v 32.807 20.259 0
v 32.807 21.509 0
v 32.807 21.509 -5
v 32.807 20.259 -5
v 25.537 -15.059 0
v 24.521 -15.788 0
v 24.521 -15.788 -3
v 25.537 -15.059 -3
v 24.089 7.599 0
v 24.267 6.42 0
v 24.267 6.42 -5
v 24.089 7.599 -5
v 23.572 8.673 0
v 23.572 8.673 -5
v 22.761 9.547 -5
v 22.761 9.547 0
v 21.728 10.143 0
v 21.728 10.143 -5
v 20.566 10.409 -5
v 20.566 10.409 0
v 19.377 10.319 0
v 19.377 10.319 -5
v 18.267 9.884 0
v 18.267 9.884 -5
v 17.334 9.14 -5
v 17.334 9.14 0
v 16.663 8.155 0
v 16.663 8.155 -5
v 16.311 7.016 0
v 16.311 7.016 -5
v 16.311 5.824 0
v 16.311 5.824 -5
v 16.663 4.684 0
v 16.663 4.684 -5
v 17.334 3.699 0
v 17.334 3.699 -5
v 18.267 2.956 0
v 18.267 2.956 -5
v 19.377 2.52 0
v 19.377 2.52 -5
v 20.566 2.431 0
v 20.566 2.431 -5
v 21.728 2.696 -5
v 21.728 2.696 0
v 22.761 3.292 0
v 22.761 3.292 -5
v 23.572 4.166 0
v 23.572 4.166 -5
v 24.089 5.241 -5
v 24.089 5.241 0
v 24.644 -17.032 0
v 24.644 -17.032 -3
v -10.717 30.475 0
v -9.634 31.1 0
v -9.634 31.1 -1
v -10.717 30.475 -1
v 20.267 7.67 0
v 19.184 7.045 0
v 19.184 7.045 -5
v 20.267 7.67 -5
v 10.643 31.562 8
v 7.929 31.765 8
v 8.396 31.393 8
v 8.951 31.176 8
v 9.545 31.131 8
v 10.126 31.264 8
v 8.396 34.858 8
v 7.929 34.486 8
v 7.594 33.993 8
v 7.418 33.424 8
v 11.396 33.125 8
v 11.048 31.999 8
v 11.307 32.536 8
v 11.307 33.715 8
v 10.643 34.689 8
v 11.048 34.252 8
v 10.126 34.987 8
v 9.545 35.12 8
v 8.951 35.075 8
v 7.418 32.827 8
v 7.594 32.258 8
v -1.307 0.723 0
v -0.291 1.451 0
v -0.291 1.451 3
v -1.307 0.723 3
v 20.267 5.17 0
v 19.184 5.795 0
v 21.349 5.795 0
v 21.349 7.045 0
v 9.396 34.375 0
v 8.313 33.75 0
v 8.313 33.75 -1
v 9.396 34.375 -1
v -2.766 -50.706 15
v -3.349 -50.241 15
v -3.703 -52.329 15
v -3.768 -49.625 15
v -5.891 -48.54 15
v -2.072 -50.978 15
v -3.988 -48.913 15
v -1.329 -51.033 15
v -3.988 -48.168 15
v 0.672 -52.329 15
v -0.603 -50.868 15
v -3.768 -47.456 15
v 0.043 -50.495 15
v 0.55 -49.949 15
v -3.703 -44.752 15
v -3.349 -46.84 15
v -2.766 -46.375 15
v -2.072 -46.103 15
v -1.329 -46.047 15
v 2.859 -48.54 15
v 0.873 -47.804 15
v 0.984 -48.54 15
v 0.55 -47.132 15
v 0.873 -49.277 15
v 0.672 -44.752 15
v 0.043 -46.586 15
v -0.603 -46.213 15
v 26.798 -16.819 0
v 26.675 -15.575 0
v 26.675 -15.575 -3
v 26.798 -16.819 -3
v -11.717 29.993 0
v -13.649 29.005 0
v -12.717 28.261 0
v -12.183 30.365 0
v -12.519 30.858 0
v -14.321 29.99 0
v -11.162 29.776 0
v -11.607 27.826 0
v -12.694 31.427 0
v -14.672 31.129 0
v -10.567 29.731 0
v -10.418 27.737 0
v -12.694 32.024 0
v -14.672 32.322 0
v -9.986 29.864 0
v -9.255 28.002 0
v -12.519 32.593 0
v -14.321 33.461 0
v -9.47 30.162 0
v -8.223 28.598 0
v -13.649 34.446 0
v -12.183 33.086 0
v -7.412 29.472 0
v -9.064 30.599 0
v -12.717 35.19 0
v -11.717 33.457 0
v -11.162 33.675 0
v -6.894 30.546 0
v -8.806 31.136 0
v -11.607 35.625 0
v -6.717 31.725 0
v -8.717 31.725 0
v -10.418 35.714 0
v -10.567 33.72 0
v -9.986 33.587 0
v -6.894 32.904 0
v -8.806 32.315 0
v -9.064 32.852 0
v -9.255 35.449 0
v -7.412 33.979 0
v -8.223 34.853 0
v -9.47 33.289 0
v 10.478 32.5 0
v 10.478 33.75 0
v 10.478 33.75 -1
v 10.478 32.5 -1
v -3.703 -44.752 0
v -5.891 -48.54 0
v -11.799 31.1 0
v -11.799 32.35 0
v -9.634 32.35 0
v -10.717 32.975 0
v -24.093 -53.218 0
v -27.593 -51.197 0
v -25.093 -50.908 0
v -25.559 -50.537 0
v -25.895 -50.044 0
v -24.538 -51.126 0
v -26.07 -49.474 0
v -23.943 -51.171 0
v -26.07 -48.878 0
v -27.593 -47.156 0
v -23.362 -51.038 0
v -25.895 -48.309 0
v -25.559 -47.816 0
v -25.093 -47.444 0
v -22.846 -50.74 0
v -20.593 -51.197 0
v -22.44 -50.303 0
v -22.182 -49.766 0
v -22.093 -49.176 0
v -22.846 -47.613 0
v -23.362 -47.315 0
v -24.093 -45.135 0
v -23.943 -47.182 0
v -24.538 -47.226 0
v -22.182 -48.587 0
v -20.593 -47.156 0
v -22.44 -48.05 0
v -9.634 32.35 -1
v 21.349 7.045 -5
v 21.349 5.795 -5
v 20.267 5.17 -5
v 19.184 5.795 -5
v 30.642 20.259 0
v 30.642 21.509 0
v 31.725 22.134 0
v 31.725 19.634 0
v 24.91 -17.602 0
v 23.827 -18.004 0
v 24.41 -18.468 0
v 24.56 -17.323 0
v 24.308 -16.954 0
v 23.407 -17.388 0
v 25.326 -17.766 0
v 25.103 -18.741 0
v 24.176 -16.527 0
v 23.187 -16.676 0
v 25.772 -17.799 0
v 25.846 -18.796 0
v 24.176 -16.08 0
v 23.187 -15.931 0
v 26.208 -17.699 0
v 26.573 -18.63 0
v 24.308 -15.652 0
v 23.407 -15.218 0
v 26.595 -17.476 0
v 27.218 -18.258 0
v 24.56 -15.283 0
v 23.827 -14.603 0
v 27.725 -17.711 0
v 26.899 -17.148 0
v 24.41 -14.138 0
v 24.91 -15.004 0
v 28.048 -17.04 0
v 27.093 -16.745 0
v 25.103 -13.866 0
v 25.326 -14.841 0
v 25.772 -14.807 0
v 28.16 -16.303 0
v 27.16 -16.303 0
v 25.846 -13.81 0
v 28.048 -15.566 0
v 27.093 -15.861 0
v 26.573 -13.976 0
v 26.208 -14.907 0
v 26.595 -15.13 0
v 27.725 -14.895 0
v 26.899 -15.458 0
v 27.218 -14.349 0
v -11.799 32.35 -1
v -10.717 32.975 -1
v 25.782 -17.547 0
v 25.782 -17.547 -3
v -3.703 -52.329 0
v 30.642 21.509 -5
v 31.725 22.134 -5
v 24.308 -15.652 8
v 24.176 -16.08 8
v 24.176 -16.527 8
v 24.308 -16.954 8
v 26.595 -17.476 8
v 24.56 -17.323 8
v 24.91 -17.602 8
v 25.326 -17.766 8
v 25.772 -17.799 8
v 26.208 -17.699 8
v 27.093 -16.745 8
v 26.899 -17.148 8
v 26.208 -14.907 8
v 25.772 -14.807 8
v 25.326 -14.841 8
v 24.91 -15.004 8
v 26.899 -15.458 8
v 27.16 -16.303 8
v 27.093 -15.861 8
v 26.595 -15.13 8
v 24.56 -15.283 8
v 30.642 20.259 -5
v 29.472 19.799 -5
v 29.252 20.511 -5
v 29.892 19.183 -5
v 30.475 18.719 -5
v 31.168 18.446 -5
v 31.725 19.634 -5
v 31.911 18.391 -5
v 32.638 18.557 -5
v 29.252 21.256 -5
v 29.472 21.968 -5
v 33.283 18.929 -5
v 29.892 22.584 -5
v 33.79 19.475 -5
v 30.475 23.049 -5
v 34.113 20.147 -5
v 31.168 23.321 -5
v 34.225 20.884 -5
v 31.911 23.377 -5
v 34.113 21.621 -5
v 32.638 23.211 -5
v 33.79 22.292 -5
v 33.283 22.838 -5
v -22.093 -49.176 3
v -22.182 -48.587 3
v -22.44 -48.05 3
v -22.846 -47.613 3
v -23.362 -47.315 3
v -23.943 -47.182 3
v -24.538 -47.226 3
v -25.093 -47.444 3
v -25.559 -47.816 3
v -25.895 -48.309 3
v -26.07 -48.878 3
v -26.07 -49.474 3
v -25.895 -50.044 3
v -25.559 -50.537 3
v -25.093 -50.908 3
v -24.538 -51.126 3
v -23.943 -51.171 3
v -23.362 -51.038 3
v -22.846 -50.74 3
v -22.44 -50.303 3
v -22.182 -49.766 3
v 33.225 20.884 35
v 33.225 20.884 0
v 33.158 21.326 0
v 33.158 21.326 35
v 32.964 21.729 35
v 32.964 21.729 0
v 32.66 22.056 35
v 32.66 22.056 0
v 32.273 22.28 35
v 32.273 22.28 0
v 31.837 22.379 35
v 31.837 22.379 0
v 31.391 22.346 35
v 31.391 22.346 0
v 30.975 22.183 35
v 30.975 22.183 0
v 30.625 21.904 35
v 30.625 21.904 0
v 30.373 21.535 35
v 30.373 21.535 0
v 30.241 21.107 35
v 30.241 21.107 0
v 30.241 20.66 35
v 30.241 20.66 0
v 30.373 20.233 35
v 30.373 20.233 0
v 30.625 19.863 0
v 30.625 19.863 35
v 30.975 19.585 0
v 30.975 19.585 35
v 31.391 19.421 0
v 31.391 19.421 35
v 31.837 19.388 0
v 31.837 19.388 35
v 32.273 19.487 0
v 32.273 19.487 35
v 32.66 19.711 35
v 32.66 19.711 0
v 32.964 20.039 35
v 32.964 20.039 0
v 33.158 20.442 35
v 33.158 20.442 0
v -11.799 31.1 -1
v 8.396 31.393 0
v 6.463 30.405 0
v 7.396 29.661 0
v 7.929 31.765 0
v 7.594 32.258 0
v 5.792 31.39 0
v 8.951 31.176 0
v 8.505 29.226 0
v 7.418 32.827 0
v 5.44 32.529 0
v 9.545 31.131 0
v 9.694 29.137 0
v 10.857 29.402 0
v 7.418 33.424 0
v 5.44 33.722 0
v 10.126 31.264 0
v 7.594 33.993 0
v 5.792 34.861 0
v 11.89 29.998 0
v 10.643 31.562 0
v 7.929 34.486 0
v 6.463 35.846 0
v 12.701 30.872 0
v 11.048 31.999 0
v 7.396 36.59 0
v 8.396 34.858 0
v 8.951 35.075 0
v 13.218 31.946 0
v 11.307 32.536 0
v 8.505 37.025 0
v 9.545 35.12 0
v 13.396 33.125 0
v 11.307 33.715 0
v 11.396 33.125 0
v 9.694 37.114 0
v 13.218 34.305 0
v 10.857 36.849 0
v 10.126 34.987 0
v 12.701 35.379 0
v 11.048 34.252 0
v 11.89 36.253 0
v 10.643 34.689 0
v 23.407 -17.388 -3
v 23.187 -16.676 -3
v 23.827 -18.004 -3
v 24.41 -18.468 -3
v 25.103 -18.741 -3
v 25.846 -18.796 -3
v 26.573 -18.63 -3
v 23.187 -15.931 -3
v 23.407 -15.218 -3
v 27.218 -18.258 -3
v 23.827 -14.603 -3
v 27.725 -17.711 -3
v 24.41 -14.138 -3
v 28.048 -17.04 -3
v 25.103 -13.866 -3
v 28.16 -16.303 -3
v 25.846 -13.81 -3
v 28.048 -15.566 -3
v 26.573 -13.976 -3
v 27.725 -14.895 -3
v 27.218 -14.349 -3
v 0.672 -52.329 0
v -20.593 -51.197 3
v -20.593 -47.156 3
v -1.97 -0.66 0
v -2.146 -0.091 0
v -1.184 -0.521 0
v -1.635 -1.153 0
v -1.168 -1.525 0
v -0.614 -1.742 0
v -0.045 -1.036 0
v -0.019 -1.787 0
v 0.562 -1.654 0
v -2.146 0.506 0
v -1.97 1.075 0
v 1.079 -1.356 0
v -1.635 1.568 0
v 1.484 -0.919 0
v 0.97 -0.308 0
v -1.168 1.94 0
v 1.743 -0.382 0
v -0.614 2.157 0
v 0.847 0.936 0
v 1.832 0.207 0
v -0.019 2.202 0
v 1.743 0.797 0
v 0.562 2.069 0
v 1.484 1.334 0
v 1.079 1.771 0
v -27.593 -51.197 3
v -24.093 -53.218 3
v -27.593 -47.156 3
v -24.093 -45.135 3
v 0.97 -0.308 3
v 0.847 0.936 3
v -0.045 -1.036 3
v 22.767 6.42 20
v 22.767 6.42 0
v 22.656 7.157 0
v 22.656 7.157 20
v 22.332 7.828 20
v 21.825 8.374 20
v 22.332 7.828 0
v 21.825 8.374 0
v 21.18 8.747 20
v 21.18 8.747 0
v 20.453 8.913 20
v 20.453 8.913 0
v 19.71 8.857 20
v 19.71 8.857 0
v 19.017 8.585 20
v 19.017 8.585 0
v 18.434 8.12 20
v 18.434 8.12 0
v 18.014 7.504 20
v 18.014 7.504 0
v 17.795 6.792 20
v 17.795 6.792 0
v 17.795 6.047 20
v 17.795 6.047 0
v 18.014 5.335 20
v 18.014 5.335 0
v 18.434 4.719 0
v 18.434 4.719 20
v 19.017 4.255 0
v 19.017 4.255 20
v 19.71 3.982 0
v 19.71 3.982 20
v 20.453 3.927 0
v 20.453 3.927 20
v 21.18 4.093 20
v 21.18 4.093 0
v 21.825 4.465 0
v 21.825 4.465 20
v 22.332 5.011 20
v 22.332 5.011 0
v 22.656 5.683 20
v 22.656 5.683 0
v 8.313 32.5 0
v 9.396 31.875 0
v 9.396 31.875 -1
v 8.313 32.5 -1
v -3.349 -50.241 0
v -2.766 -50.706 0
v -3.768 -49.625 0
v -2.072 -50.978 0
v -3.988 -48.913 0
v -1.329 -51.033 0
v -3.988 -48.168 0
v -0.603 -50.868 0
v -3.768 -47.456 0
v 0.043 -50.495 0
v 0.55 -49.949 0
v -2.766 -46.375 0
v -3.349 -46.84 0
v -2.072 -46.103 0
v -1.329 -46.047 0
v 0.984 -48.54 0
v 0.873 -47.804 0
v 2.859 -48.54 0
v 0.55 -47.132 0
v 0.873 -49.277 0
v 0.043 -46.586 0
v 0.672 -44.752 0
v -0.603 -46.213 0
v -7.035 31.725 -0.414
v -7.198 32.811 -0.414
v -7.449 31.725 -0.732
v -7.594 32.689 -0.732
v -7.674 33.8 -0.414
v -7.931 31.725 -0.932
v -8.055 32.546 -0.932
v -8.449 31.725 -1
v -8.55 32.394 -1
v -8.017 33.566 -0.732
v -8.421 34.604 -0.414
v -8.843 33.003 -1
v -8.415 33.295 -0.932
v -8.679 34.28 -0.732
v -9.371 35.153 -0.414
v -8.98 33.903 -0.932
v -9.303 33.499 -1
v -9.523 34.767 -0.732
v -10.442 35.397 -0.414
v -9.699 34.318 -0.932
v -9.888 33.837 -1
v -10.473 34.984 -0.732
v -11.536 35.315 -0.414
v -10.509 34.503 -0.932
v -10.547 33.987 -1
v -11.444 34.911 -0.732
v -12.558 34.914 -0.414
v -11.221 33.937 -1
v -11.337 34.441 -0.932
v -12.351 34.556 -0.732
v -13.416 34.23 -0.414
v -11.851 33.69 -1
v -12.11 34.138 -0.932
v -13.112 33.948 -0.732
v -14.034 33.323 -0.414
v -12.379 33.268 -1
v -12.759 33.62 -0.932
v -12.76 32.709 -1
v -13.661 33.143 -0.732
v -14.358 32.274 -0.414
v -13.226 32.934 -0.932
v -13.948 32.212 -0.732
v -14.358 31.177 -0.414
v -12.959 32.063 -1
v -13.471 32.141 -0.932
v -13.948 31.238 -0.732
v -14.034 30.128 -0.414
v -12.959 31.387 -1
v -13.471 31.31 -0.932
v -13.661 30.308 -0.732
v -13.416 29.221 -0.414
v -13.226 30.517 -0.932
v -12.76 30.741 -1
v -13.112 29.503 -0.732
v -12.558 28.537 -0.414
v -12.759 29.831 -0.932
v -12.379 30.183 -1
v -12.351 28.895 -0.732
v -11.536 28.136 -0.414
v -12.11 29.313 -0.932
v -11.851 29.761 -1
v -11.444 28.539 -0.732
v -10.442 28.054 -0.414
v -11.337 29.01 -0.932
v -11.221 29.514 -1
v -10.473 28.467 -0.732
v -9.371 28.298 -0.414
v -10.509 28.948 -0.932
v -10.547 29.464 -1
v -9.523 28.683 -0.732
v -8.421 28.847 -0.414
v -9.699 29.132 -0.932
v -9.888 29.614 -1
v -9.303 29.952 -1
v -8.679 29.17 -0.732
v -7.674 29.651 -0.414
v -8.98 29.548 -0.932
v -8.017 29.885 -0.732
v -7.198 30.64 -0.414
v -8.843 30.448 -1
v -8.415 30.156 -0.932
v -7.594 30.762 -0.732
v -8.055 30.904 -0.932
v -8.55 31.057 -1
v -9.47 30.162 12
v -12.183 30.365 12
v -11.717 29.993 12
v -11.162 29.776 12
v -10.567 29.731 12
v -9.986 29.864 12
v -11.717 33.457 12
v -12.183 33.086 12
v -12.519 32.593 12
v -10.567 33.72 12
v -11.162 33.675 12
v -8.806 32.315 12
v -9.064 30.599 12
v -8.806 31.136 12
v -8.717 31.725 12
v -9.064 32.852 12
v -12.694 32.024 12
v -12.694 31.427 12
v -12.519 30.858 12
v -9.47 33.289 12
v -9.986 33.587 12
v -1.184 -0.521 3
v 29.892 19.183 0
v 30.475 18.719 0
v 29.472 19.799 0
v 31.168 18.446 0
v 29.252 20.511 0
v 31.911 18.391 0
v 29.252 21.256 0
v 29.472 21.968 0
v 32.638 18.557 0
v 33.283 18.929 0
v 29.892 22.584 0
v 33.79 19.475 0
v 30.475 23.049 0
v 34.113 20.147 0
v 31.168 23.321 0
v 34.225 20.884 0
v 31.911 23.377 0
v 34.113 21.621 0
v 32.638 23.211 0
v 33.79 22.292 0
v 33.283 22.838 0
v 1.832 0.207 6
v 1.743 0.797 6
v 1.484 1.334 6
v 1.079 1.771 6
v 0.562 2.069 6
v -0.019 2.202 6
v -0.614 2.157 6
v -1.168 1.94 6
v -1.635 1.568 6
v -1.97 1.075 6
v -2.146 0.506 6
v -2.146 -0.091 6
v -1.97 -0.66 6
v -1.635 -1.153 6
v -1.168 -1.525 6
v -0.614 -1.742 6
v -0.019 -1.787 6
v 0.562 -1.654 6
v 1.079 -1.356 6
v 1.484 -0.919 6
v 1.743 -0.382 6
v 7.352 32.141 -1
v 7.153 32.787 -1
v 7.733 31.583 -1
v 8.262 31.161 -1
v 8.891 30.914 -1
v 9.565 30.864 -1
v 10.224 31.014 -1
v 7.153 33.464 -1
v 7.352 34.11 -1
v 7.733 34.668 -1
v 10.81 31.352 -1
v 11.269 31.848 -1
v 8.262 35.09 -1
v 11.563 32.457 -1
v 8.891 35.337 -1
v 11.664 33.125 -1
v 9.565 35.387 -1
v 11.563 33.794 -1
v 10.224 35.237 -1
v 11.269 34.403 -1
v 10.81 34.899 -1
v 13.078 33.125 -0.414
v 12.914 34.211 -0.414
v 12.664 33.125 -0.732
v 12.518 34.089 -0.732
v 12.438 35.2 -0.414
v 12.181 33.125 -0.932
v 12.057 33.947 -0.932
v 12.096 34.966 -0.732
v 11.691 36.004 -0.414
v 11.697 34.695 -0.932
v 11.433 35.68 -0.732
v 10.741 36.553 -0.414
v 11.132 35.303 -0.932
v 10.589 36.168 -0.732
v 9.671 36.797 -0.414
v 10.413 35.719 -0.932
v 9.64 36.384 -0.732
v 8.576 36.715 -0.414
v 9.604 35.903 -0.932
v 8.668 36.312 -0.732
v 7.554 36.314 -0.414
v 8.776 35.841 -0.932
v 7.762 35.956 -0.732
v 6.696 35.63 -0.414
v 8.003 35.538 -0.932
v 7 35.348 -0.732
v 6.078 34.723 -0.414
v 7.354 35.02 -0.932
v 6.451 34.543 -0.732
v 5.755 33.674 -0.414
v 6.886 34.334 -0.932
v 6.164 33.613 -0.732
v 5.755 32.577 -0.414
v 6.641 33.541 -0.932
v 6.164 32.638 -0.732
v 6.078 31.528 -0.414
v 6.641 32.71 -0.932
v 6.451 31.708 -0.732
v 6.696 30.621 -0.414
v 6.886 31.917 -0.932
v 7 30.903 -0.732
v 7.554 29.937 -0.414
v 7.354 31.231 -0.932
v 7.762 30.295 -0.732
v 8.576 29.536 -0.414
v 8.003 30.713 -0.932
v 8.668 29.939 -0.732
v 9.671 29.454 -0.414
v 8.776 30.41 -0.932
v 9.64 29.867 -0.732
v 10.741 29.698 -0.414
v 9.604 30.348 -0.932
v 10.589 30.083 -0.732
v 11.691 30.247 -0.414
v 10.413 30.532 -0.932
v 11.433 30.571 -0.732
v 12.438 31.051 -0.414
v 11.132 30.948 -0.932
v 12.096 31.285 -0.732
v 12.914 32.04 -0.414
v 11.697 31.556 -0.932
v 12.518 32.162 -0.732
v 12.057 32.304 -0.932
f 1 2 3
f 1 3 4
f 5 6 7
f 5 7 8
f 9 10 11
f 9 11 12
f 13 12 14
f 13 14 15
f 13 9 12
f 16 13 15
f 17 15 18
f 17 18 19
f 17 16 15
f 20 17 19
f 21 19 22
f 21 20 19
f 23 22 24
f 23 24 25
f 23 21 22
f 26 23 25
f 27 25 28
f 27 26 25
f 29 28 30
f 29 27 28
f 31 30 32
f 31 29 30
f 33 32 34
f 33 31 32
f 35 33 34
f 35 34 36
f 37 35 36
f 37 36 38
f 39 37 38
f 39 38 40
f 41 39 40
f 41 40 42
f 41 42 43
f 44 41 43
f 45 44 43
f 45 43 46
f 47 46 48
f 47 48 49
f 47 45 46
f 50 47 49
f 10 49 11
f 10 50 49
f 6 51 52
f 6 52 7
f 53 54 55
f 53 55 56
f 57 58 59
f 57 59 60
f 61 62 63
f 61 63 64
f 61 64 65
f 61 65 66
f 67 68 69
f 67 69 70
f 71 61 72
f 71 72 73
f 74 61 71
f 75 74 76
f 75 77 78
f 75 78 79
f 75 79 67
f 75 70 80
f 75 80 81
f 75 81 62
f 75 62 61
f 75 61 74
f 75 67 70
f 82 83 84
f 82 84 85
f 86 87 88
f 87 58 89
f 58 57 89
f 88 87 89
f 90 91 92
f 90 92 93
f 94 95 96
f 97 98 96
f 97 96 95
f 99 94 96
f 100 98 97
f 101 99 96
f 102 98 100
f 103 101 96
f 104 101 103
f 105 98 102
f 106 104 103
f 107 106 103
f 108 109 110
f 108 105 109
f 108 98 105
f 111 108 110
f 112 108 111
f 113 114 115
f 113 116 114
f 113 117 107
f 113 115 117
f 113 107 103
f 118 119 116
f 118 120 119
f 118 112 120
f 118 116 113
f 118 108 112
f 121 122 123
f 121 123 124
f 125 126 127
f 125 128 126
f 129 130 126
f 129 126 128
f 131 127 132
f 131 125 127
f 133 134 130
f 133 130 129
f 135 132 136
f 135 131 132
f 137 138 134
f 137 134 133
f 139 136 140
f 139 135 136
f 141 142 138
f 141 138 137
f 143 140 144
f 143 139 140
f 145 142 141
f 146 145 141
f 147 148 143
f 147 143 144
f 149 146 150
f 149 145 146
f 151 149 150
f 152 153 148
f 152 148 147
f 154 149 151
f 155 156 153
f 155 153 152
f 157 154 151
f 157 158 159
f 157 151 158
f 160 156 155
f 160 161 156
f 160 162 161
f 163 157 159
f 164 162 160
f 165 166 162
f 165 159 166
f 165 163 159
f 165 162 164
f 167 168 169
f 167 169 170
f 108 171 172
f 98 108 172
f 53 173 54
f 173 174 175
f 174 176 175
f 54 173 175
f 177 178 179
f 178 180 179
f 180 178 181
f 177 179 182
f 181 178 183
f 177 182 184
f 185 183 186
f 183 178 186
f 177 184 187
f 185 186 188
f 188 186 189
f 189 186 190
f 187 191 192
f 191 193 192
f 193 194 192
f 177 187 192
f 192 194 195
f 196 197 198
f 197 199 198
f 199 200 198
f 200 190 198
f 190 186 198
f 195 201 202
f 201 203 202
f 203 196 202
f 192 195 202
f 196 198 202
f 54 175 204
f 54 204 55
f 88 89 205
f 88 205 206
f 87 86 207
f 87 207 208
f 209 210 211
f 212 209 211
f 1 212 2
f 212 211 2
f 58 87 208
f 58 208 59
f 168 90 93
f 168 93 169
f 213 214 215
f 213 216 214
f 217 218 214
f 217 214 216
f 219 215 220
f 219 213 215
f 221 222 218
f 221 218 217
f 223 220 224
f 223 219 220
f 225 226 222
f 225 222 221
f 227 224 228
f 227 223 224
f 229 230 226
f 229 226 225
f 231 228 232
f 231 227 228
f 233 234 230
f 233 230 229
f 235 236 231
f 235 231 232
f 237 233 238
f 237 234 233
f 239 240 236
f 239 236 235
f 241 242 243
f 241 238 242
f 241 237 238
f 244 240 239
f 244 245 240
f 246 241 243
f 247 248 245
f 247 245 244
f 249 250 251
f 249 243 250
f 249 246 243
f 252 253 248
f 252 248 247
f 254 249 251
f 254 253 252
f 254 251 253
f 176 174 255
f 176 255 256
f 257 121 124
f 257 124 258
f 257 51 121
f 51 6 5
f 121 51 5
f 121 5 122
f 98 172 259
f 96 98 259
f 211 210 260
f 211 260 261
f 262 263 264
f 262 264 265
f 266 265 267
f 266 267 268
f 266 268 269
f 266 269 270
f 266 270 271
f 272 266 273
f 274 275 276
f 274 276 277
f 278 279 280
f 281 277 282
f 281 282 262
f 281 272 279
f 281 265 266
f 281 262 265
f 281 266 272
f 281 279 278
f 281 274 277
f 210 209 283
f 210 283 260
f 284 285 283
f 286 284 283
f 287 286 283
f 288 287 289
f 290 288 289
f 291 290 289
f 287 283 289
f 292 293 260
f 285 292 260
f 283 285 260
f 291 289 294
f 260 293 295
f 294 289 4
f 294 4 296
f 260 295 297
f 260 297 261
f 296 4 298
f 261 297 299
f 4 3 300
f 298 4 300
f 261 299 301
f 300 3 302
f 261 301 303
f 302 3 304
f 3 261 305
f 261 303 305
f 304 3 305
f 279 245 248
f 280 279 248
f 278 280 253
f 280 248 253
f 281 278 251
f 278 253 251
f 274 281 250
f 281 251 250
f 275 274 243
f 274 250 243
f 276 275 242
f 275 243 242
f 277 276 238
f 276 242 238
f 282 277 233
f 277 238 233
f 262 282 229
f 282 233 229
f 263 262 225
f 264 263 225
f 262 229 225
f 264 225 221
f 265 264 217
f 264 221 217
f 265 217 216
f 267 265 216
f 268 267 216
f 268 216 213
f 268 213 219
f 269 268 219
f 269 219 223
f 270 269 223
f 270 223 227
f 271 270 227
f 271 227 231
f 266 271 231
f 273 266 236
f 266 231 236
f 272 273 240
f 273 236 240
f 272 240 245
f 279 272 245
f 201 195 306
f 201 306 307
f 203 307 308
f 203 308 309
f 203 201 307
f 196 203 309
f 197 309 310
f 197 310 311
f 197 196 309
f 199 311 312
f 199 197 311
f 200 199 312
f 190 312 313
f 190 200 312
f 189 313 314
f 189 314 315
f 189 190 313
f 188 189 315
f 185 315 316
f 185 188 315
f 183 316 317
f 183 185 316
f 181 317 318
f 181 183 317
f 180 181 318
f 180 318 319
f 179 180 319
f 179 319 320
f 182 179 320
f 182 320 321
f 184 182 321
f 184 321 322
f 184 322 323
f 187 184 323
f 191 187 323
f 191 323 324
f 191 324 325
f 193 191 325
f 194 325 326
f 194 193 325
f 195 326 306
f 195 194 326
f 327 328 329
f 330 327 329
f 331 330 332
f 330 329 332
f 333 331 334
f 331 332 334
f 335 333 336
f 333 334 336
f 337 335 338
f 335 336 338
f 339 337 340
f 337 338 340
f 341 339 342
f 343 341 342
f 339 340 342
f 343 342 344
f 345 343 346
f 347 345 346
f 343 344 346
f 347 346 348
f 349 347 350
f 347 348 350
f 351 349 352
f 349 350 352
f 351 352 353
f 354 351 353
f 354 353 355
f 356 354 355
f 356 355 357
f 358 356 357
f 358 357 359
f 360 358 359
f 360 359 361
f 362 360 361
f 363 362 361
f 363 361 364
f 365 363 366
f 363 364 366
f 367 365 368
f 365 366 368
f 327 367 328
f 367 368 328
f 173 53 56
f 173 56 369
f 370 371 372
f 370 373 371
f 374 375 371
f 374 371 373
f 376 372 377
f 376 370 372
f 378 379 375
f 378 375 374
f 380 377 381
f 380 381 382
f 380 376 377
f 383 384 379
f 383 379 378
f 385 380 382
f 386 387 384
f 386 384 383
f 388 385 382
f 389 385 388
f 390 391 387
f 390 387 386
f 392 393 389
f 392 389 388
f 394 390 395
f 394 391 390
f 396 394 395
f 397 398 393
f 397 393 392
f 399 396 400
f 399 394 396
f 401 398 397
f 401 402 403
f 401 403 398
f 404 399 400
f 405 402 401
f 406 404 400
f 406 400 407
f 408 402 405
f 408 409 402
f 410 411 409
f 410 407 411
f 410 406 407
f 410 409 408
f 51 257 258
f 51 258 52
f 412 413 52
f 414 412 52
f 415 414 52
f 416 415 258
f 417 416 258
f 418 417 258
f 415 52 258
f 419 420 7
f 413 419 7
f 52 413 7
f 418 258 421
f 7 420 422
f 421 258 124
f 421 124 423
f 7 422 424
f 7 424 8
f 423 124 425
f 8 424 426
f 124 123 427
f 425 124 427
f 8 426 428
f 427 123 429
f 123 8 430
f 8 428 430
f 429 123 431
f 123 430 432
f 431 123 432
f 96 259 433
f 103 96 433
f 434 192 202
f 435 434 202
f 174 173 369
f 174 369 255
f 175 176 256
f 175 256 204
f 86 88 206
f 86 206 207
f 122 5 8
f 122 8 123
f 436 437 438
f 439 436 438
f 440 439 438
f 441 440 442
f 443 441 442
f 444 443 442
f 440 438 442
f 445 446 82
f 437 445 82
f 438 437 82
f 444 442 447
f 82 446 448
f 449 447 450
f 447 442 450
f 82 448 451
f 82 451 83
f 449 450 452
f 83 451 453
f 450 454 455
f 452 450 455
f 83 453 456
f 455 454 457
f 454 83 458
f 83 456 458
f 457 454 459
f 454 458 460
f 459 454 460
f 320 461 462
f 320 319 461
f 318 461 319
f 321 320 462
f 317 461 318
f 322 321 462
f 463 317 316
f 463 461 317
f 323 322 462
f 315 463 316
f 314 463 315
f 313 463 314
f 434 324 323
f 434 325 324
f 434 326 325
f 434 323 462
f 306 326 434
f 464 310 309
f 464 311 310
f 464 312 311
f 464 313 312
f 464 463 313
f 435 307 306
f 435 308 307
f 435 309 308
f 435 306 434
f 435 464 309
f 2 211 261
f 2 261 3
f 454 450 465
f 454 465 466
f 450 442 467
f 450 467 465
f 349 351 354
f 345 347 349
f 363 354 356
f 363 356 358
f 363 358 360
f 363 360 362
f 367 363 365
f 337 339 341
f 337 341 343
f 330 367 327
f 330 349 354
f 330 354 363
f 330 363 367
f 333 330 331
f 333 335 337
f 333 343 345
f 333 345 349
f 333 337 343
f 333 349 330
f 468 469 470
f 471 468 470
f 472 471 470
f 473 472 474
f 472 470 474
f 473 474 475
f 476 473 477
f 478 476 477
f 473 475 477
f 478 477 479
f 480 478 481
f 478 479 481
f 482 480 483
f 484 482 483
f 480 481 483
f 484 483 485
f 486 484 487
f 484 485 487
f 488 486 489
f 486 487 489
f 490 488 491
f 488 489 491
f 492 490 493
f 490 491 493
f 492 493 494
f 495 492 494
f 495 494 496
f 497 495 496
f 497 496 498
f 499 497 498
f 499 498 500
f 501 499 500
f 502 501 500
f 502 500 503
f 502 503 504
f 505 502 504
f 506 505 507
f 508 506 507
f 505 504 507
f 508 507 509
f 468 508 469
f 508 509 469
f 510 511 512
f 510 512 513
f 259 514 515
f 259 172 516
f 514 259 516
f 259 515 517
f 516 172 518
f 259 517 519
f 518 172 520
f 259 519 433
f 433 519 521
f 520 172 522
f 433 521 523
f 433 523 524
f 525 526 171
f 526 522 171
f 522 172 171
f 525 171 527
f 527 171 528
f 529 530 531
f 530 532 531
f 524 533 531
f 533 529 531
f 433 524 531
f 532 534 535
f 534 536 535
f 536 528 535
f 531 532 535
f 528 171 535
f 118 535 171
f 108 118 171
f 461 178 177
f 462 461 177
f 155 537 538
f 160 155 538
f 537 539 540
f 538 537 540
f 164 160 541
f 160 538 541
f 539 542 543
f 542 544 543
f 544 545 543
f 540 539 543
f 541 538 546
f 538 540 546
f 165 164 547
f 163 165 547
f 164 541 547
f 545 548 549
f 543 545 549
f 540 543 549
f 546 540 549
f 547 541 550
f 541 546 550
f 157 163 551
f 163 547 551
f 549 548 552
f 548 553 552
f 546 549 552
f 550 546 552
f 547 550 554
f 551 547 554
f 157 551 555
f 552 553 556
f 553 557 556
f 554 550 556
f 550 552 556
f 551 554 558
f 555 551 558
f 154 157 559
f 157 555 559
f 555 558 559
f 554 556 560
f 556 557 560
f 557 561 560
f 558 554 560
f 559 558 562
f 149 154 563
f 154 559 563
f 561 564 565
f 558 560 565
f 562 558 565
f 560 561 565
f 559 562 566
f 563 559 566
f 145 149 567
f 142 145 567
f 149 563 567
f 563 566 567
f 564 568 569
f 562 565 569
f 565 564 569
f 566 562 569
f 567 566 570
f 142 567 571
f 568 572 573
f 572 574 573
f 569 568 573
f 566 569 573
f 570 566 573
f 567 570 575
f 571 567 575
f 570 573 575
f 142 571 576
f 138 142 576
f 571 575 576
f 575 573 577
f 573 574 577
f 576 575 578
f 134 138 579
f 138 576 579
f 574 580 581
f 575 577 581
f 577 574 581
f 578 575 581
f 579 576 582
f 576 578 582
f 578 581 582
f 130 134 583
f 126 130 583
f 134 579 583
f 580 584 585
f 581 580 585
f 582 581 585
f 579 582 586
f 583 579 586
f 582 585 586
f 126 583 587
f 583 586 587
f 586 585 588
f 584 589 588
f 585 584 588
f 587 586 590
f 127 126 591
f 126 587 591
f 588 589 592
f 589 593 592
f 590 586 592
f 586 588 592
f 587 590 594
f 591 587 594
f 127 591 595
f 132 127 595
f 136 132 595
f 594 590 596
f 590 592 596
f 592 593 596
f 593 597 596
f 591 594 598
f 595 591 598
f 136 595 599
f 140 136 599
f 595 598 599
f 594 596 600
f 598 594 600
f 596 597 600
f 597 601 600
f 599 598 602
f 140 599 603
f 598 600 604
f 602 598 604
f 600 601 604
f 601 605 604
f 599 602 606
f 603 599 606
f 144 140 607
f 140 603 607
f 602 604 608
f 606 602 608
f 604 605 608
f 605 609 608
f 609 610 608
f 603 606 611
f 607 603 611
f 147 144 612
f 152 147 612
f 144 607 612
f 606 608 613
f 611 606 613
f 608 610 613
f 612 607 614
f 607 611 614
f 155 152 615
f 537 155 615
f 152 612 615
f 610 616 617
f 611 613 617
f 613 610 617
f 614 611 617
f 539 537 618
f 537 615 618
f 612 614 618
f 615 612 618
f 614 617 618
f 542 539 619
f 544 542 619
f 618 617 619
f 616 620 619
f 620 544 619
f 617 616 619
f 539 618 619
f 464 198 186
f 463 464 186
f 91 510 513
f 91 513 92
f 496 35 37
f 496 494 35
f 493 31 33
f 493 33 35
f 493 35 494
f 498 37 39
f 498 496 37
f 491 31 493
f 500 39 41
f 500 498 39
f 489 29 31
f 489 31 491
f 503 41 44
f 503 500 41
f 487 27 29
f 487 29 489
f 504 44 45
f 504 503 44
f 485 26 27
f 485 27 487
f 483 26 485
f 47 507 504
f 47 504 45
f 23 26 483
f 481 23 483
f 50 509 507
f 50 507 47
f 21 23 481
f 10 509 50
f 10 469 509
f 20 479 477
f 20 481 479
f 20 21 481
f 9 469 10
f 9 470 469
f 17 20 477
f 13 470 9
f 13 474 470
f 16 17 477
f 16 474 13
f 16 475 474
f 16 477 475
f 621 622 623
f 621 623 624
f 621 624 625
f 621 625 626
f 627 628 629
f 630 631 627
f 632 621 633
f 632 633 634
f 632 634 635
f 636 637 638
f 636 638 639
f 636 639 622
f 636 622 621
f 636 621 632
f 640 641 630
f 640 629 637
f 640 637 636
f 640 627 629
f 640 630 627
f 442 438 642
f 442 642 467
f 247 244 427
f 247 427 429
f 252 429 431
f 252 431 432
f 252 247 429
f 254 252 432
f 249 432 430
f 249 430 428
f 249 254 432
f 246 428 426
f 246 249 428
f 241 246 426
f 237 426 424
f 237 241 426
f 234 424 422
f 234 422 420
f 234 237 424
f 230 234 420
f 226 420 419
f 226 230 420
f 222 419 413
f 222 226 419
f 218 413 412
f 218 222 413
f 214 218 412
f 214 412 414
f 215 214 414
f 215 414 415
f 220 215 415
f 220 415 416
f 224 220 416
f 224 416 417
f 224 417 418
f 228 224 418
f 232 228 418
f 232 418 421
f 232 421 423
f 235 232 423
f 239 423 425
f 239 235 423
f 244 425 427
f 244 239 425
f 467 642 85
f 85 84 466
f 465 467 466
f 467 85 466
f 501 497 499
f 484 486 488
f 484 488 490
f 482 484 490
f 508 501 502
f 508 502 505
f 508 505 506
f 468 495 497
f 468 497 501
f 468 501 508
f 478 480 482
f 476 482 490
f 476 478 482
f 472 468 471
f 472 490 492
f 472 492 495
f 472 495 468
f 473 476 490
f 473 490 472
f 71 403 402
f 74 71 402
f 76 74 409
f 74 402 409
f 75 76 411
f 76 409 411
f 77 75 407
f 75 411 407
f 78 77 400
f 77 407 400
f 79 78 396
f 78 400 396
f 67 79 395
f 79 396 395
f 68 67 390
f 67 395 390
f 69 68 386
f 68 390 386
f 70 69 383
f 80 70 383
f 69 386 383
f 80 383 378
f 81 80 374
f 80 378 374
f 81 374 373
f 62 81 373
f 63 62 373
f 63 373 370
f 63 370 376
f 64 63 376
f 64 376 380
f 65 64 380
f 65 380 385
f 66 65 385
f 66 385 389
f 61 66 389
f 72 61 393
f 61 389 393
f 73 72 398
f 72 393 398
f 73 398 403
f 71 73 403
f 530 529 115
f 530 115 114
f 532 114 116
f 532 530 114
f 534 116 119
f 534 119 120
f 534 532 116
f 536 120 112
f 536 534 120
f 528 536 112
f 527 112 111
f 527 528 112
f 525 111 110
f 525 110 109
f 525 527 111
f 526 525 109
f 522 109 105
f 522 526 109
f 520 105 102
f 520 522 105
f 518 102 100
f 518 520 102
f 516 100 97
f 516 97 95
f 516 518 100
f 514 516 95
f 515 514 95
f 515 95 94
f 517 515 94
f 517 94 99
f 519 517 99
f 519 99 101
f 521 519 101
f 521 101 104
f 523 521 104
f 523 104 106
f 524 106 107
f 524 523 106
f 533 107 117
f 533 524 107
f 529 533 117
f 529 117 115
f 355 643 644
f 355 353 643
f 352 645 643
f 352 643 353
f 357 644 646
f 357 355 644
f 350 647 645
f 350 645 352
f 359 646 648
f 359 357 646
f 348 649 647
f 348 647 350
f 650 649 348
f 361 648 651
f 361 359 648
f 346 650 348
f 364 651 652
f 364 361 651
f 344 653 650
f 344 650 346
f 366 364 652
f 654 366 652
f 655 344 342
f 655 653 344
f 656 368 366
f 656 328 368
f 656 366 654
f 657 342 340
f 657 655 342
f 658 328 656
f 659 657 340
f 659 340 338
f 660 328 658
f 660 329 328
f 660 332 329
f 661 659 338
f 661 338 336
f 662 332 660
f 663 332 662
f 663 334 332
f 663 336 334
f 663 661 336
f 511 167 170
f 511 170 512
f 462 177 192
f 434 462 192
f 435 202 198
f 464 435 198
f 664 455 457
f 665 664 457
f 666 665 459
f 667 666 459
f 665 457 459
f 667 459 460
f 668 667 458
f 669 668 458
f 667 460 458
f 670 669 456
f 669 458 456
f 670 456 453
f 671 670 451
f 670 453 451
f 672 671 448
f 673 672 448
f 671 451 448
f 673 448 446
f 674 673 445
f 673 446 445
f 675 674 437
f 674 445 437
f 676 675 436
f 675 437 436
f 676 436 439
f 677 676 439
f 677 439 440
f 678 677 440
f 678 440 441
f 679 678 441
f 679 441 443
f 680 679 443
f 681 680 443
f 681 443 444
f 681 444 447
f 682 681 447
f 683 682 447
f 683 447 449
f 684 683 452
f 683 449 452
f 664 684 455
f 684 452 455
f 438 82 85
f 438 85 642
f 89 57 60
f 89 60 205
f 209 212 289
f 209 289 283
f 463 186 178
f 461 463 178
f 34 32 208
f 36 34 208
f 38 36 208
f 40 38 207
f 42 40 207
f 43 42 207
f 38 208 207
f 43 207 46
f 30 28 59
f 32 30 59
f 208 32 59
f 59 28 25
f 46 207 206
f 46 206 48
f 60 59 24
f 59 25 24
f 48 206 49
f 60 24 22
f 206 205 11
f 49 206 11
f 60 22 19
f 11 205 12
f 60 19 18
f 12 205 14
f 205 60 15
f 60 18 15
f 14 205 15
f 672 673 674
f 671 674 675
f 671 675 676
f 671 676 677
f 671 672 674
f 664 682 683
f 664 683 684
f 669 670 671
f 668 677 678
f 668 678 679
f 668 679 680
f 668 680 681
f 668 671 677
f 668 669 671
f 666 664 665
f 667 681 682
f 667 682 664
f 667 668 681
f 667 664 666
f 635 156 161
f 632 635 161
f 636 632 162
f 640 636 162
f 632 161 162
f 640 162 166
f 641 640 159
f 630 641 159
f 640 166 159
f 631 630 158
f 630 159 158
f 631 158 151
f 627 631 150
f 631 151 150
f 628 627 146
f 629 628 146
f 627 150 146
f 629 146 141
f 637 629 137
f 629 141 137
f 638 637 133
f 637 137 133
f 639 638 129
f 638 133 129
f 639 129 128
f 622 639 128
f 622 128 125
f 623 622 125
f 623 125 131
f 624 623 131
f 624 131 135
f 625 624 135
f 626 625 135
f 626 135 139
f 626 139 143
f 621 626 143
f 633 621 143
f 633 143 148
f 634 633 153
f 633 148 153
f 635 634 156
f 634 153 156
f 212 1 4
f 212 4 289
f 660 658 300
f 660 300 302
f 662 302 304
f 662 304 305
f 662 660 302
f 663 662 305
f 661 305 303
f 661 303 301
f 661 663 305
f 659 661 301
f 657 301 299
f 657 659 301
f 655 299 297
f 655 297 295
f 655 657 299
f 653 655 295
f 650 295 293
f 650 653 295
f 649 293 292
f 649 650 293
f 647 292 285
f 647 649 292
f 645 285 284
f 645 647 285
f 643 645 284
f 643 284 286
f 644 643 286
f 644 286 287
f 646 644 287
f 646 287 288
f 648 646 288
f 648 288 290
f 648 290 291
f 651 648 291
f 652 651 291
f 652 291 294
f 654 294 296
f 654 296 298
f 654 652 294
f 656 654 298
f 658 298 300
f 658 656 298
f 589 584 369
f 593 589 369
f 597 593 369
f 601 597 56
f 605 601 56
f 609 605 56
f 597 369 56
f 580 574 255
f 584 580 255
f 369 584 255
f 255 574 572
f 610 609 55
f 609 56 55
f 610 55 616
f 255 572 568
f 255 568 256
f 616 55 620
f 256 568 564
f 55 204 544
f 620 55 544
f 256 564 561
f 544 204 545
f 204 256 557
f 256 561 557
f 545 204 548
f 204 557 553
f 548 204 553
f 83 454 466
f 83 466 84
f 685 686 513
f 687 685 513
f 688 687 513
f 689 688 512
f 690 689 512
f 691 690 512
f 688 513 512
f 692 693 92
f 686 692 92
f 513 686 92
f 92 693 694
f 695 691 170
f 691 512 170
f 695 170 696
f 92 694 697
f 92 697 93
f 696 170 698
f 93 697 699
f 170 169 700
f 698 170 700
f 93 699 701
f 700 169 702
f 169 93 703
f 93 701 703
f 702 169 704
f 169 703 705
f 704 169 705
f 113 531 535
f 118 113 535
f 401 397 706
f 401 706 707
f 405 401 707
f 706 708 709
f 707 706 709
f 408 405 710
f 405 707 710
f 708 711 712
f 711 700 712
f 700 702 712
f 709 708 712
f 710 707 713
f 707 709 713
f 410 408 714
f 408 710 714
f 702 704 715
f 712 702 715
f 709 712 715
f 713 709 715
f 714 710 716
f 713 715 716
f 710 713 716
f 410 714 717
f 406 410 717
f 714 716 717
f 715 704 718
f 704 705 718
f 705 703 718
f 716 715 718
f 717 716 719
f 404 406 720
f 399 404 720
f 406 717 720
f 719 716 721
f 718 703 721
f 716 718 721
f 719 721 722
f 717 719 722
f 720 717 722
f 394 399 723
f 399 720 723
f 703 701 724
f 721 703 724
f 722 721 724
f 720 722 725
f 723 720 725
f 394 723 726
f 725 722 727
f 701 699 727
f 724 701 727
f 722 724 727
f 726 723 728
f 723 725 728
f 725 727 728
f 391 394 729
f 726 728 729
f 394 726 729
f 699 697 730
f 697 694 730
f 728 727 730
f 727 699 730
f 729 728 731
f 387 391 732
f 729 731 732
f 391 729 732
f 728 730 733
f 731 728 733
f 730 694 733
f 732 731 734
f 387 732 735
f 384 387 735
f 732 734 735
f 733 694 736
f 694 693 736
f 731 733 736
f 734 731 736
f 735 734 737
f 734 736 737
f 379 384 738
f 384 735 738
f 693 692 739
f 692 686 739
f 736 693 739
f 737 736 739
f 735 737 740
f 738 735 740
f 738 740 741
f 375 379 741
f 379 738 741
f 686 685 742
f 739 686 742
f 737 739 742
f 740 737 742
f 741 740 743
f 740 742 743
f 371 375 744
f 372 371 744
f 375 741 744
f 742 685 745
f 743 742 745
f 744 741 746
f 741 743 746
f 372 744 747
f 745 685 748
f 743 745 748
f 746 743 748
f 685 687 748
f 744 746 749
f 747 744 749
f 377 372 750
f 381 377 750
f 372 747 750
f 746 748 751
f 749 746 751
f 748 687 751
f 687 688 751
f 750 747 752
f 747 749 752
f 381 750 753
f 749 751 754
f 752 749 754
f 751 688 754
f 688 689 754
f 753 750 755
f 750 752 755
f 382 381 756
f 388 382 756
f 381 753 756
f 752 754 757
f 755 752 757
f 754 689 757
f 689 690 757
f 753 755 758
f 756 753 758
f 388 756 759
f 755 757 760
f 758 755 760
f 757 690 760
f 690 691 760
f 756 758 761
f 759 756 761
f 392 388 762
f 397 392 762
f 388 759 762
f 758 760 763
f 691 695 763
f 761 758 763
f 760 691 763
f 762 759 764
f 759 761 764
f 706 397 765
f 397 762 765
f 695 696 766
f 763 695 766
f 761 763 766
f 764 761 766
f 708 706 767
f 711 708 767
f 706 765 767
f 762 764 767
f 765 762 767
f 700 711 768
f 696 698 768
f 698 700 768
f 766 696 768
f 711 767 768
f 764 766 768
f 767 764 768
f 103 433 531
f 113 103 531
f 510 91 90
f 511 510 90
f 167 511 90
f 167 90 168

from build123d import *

# Parameters (mm, degrees)
F0_R      = 2
F1_DEPTH  = 6
F0_R_2    = 1.5
F2_DEPTH  = 8
F0_R_3    = 2.5
F3_DEPTH  = 3
F4_DEPTH  = 20
F0_R_4    = 4
F5_DEPTH  = 5
F6_DEPTH  = 3
F7_DEPTH  = 8
F8_DEPTH  = 1
F10_DEPTH = 35
F11_DEPTH = 3
F12_DEPTH = 12
F13_DEPTH = 15


# Not quite as in the source:
# - a fillet or chamfer that OpenCascade refuses, or shapes differently, is made with other operations: its cross-section is extruded or revolved along the edge and cut away or added


with BuildPart() as f1:
    # F0 (on Top) → F1 (new body)
    with BuildSketch(Plane.XY):
        with Locations((-0.1684613526, 0.2074986696)):
            Circle(F0_R)
        Polygon((-1.3072340101, 0.7229565578), (-0.2914480557, 1.4514336643), (0.8473246019, 0.9359757761), (0.970311305, -0.3079592185), (-0.0454746495, -1.036436325), (-1.1842473071, -0.5209784369), align=None, mode=Mode.SUBTRACT)
        Polygon((0.8473246019, 0.9359757761), (-0.2914480557, 1.4514336643), (-1.3072340101, 0.7229565578), (-1.1842473071, -0.5209784369), (-0.0454746495, -1.036436325), (0.970311305, -0.3079592185), align=None)
    extrude(amount=F1_DEPTH)

    # F0 (on Top) → F6 (cut)
    with BuildSketch(Plane.XY):
        Polygon((0.8473246019, 0.9359757761), (-0.2914480557, 1.4514336643), (-1.3072340101, 0.7229565578), (-1.1842473071, -0.5209784369), (-0.0454746495, -1.036436325), (0.970311305, -0.3079592185), align=None)
    extrude(amount=F6_DEPTH, mode=Mode.SUBTRACT)


with BuildPart() as f2:
    # F0 (on Top) → F2 (new body)
    with BuildSketch(Plane.XY):
        with Locations((25.6595015526, -16.3031816483)):
            Circle(F0_R_2)
        Polygon((24.520728895, -15.7877237601), (25.5365148495, -15.0592466536), (26.6752875071, -15.5747045418), (26.7982742101, -16.8186395364), (25.7824882557, -17.5471166429), (24.6437155981, -17.0316587548), align=None, mode=Mode.SUBTRACT)
        Polygon((26.6752875071, -15.5747045418), (25.5365148495, -15.0592466536), (24.520728895, -15.7877237601), (24.6437155981, -17.0316587548), (25.7824882557, -17.5471166429), (26.7982742101, -16.8186395364), align=None)
    extrude(amount=F2_DEPTH)

    # F0 (on Top) → F3 (join)
    with BuildSketch(Plane.XY):
        with Locations((25.6595015526, -16.3031816483)):
            Circle(F0_R_3)
        with Locations((25.6595015526, -16.3031816483)):
            Circle(F0_R_2, mode=Mode.SUBTRACT)
        with Locations((25.6595015526, -16.3031816483)):
            Circle(F0_R_2)
        Polygon((24.520728895, -15.7877237601), (25.5365148495, -15.0592466536), (26.6752875071, -15.5747045418), (26.7982742101, -16.8186395364), (25.7824882557, -17.5471166429), (24.6437155981, -17.0316587548), align=None, mode=Mode.SUBTRACT)
    extrude(amount=-F3_DEPTH)


with BuildPart() as f4:
    # F0 (on Top) → F4 (new body)
    with BuildSketch(Plane.XY):
        with Locations((20.266674459, 6.419762969)):
            Circle(F0_R_3)
        Polygon((19.1841427043, 7.044762969), (20.266674459, 7.669762969), (21.3492062137, 7.044762969), (21.3492062137, 5.794762969), (20.266674459, 5.169762969), (19.1841427043, 5.794762969), align=None, mode=Mode.SUBTRACT)
        Polygon((21.3492062137, 7.044762969), (20.266674459, 7.669762969), (19.1841427043, 7.044762969), (19.1841427043, 5.794762969), (20.266674459, 5.169762969), (21.3492062137, 5.794762969), align=None)
    extrude(amount=F4_DEPTH)

    # F0 (on Top) → F5 (join)
    with BuildSketch(Plane.XY):
        with Locations((20.266674459, 6.419762969)):
            Circle(F0_R_4)
        with Locations((20.266674459, 6.419762969)):
            Circle(F0_R_3, mode=Mode.SUBTRACT)
        with Locations((20.266674459, 6.419762969)):
            Circle(F0_R_3)
        Polygon((19.1841427043, 7.044762969), (20.266674459, 7.669762969), (21.3492062137, 7.044762969), (21.3492062137, 5.794762969), (20.266674459, 5.169762969), (19.1841427043, 5.794762969), align=None, mode=Mode.SUBTRACT)
    extrude(amount=-F5_DEPTH)


with BuildPart() as f5:
    # F0 (on Top) → F5, piece 2 (new body)
    with BuildSketch(Plane.XY):
        with Locations((31.7245647311, 20.8836849779)):
            Circle(F0_R_3)
        with Locations((31.7245647311, 20.8836849779)):
            Circle(F0_R_2, mode=Mode.SUBTRACT)
        with Locations((31.7245647311, 20.8836849779)):
            Circle(F0_R_2)
        Polygon((30.6420329764, 21.5086849779), (31.7245647311, 22.1336849779), (32.8070964859, 21.5086849779), (32.8070964859, 20.2586849779), (31.7245647311, 19.6336849779), (30.6420329764, 20.2586849779), align=None, mode=Mode.SUBTRACT)
    extrude(amount=-F5_DEPTH)

    # F0 (on Top) → F10 (join)
    with BuildSketch(Plane.XY):
        with Locations((31.7245647311, 20.8836849779)):
            Circle(F0_R_2)
        Polygon((30.6420329764, 21.5086849779), (31.7245647311, 22.1336849779), (32.8070964859, 21.5086849779), (32.8070964859, 20.2586849779), (31.7245647311, 19.6336849779), (30.6420329764, 20.2586849779), align=None, mode=Mode.SUBTRACT)
        Polygon((32.8070964859, 21.5086849779), (31.7245647311, 22.1336849779), (30.6420329764, 21.5086849779), (30.6420329764, 20.2586849779), (31.7245647311, 19.6336849779), (32.8070964859, 20.2586849779), align=None)
    extrude(amount=F10_DEPTH)


with BuildPart() as f7:
    # F0 (on Top) → F7 (new body)
    with BuildSketch(Plane.XY):
        with Locations((9.3955630437, 33.1254936755)):
            Circle(F0_R)
        Polygon((8.3130312889, 33.7504936755), (9.3955630437, 34.3754936755), (10.4780947984, 33.7504936755), (10.4780947984, 32.5004936755), (9.3955630437, 31.8754936755), (8.3130312889, 32.5004936755), align=None, mode=Mode.SUBTRACT)
        Polygon((10.4780947984, 33.7504936755), (9.3955630437, 34.3754936755), (8.3130312889, 33.7504936755), (8.3130312889, 32.5004936755), (9.3955630437, 31.8754936755), (10.4780947984, 32.5004936755), align=None)
    extrude(amount=F7_DEPTH)

    # F0 (on Top) → F8 (join)
    with BuildSketch(Plane.XY):
        with Locations((9.3955630437, 33.1254936755)):
            Circle(F0_R_4)
        with Locations((9.3955630437, 33.1254936755)):
            Circle(F0_R, mode=Mode.SUBTRACT)
        with Locations((9.3955630437, 33.1254936755)):
            Circle(F0_R)
        Polygon((8.3130312889, 33.7504936755), (9.3955630437, 34.3754936755), (10.4780947984, 33.7504936755), (10.4780947984, 32.5004936755), (9.3955630437, 31.8754936755), (8.3130312889, 32.5004936755), align=None, mode=Mode.SUBTRACT)
    extrude(amount=-F8_DEPTH)

    # F9: fillet of radius 2 on 1 edges, made by hand

    # F9_s1 → F9_t2 (revolve, cut)
    with BuildSketch(Plane.XZ.offset(-33.1254936755)):
        with BuildLine():
            ThreePointArc((13.3955630437, 0), (12.6635122361, -0.7320508076), (11.6635122361, -1))
            Line((11.6635122361, -1), (13.3955630437, -1))
            Line((13.3955630437, -1), (13.3955630437, 0))
        make_face()
    revolve(axis=Axis((9.3955630437, 33.1254936755, -1), (0, 0, 1)), mode=Mode.SUBTRACT)


with BuildPart() as f8:
    # F0 (on Top) → F8, piece 2 (new body)
    with BuildSketch(Plane.XY):
        with Locations((-10.7167446986, 31.7254327238)):
            Circle(F0_R_4)
        with Locations((-10.7167446986, 31.7254327238)):
            Circle(F0_R, mode=Mode.SUBTRACT)
        with Locations((-10.7167446986, 31.7254327238)):
            Circle(F0_R)
        Polygon((-11.7992764533, 32.3504327238), (-10.7167446986, 32.9754327238), (-9.6342129439, 32.3504327238), (-9.6342129439, 31.1004327238), (-10.7167446986, 30.4754327238), (-11.7992764533, 31.1004327238), align=None, mode=Mode.SUBTRACT)
    extrude(amount=-F8_DEPTH)

    # F9#2: fillet of radius 2 on 1 edges, made by hand

    # F9_2_s1 → F9_2_t2 (revolve, cut)
    with BuildSketch(Plane.XZ.offset(-31.7254327238)):
        with BuildLine():
            ThreePointArc((-6.7167446986, 0), (-7.4487955062, -0.7320508076), (-8.4487955062, -1))
            Line((-8.4487955062, -1), (-6.7167446986, -1))
            Line((-6.7167446986, -1), (-6.7167446986, 0))
        make_face()
    revolve(axis=Axis((-10.7167446986, 31.7254327238, -1), (0, 0, 1)), mode=Mode.SUBTRACT)

    # F0 (on Top) → F12 (join)
    with BuildSketch(Plane.XY):
        with Locations((-10.7167446986, 31.7254327238)):
            Circle(F0_R)
        Polygon((-11.7992764533, 32.3504327238), (-10.7167446986, 32.9754327238), (-9.6342129439, 32.3504327238), (-9.6342129439, 31.1004327238), (-10.7167446986, 30.4754327238), (-11.7992764533, 31.1004327238), align=None, mode=Mode.SUBTRACT)
        Polygon((-9.6342129439, 32.3504327238), (-10.7167446986, 32.9754327238), (-11.7992764533, 32.3504327238), (-11.7992764533, 31.1004327238), (-10.7167446986, 30.4754327238), (-9.6342129439, 31.1004327238), align=None)
    extrude(amount=F12_DEPTH)


with BuildPart() as f11:
    # F0 (on Top) → F11 (new body)
    with BuildSketch(Plane.XY):
        Polygon((-20.59273386, -51.1970724528), (-20.59273386, -47.1556205685), (-24.09273386, -45.1348946263), (-27.59273386, -47.1556205685), (-27.59273386, -51.1970724528), (-24.09273386, -53.217798395), align=None)
        with Locations((-24.09273386, -49.1763465106)):
            Circle(F0_R, mode=Mode.SUBTRACT)
    extrude(amount=F11_DEPTH)


with BuildPart() as f13:
    # F0 (on Top) → F13 (new body)
    with BuildSketch(Plane.XY):
        Polygon((0.6715684338, -52.3293341259), (2.8590684338, -48.5404729843), (0.6715684338, -44.7516118428), (-3.7034315662, -44.7516118428), (-5.8909315662, -48.5404729843), (-3.7034315662, -52.3293341259), align=None)
        with Locations((-1.5159315662, -48.5404729843)):
            Circle(F0_R_3, mode=Mode.SUBTRACT)
    extrude(amount=F13_DEPTH)


solid = Compound([f1.part, f2.part, f4.part, f5.part, f7.part, f8.part, f11.part, f13.part])
